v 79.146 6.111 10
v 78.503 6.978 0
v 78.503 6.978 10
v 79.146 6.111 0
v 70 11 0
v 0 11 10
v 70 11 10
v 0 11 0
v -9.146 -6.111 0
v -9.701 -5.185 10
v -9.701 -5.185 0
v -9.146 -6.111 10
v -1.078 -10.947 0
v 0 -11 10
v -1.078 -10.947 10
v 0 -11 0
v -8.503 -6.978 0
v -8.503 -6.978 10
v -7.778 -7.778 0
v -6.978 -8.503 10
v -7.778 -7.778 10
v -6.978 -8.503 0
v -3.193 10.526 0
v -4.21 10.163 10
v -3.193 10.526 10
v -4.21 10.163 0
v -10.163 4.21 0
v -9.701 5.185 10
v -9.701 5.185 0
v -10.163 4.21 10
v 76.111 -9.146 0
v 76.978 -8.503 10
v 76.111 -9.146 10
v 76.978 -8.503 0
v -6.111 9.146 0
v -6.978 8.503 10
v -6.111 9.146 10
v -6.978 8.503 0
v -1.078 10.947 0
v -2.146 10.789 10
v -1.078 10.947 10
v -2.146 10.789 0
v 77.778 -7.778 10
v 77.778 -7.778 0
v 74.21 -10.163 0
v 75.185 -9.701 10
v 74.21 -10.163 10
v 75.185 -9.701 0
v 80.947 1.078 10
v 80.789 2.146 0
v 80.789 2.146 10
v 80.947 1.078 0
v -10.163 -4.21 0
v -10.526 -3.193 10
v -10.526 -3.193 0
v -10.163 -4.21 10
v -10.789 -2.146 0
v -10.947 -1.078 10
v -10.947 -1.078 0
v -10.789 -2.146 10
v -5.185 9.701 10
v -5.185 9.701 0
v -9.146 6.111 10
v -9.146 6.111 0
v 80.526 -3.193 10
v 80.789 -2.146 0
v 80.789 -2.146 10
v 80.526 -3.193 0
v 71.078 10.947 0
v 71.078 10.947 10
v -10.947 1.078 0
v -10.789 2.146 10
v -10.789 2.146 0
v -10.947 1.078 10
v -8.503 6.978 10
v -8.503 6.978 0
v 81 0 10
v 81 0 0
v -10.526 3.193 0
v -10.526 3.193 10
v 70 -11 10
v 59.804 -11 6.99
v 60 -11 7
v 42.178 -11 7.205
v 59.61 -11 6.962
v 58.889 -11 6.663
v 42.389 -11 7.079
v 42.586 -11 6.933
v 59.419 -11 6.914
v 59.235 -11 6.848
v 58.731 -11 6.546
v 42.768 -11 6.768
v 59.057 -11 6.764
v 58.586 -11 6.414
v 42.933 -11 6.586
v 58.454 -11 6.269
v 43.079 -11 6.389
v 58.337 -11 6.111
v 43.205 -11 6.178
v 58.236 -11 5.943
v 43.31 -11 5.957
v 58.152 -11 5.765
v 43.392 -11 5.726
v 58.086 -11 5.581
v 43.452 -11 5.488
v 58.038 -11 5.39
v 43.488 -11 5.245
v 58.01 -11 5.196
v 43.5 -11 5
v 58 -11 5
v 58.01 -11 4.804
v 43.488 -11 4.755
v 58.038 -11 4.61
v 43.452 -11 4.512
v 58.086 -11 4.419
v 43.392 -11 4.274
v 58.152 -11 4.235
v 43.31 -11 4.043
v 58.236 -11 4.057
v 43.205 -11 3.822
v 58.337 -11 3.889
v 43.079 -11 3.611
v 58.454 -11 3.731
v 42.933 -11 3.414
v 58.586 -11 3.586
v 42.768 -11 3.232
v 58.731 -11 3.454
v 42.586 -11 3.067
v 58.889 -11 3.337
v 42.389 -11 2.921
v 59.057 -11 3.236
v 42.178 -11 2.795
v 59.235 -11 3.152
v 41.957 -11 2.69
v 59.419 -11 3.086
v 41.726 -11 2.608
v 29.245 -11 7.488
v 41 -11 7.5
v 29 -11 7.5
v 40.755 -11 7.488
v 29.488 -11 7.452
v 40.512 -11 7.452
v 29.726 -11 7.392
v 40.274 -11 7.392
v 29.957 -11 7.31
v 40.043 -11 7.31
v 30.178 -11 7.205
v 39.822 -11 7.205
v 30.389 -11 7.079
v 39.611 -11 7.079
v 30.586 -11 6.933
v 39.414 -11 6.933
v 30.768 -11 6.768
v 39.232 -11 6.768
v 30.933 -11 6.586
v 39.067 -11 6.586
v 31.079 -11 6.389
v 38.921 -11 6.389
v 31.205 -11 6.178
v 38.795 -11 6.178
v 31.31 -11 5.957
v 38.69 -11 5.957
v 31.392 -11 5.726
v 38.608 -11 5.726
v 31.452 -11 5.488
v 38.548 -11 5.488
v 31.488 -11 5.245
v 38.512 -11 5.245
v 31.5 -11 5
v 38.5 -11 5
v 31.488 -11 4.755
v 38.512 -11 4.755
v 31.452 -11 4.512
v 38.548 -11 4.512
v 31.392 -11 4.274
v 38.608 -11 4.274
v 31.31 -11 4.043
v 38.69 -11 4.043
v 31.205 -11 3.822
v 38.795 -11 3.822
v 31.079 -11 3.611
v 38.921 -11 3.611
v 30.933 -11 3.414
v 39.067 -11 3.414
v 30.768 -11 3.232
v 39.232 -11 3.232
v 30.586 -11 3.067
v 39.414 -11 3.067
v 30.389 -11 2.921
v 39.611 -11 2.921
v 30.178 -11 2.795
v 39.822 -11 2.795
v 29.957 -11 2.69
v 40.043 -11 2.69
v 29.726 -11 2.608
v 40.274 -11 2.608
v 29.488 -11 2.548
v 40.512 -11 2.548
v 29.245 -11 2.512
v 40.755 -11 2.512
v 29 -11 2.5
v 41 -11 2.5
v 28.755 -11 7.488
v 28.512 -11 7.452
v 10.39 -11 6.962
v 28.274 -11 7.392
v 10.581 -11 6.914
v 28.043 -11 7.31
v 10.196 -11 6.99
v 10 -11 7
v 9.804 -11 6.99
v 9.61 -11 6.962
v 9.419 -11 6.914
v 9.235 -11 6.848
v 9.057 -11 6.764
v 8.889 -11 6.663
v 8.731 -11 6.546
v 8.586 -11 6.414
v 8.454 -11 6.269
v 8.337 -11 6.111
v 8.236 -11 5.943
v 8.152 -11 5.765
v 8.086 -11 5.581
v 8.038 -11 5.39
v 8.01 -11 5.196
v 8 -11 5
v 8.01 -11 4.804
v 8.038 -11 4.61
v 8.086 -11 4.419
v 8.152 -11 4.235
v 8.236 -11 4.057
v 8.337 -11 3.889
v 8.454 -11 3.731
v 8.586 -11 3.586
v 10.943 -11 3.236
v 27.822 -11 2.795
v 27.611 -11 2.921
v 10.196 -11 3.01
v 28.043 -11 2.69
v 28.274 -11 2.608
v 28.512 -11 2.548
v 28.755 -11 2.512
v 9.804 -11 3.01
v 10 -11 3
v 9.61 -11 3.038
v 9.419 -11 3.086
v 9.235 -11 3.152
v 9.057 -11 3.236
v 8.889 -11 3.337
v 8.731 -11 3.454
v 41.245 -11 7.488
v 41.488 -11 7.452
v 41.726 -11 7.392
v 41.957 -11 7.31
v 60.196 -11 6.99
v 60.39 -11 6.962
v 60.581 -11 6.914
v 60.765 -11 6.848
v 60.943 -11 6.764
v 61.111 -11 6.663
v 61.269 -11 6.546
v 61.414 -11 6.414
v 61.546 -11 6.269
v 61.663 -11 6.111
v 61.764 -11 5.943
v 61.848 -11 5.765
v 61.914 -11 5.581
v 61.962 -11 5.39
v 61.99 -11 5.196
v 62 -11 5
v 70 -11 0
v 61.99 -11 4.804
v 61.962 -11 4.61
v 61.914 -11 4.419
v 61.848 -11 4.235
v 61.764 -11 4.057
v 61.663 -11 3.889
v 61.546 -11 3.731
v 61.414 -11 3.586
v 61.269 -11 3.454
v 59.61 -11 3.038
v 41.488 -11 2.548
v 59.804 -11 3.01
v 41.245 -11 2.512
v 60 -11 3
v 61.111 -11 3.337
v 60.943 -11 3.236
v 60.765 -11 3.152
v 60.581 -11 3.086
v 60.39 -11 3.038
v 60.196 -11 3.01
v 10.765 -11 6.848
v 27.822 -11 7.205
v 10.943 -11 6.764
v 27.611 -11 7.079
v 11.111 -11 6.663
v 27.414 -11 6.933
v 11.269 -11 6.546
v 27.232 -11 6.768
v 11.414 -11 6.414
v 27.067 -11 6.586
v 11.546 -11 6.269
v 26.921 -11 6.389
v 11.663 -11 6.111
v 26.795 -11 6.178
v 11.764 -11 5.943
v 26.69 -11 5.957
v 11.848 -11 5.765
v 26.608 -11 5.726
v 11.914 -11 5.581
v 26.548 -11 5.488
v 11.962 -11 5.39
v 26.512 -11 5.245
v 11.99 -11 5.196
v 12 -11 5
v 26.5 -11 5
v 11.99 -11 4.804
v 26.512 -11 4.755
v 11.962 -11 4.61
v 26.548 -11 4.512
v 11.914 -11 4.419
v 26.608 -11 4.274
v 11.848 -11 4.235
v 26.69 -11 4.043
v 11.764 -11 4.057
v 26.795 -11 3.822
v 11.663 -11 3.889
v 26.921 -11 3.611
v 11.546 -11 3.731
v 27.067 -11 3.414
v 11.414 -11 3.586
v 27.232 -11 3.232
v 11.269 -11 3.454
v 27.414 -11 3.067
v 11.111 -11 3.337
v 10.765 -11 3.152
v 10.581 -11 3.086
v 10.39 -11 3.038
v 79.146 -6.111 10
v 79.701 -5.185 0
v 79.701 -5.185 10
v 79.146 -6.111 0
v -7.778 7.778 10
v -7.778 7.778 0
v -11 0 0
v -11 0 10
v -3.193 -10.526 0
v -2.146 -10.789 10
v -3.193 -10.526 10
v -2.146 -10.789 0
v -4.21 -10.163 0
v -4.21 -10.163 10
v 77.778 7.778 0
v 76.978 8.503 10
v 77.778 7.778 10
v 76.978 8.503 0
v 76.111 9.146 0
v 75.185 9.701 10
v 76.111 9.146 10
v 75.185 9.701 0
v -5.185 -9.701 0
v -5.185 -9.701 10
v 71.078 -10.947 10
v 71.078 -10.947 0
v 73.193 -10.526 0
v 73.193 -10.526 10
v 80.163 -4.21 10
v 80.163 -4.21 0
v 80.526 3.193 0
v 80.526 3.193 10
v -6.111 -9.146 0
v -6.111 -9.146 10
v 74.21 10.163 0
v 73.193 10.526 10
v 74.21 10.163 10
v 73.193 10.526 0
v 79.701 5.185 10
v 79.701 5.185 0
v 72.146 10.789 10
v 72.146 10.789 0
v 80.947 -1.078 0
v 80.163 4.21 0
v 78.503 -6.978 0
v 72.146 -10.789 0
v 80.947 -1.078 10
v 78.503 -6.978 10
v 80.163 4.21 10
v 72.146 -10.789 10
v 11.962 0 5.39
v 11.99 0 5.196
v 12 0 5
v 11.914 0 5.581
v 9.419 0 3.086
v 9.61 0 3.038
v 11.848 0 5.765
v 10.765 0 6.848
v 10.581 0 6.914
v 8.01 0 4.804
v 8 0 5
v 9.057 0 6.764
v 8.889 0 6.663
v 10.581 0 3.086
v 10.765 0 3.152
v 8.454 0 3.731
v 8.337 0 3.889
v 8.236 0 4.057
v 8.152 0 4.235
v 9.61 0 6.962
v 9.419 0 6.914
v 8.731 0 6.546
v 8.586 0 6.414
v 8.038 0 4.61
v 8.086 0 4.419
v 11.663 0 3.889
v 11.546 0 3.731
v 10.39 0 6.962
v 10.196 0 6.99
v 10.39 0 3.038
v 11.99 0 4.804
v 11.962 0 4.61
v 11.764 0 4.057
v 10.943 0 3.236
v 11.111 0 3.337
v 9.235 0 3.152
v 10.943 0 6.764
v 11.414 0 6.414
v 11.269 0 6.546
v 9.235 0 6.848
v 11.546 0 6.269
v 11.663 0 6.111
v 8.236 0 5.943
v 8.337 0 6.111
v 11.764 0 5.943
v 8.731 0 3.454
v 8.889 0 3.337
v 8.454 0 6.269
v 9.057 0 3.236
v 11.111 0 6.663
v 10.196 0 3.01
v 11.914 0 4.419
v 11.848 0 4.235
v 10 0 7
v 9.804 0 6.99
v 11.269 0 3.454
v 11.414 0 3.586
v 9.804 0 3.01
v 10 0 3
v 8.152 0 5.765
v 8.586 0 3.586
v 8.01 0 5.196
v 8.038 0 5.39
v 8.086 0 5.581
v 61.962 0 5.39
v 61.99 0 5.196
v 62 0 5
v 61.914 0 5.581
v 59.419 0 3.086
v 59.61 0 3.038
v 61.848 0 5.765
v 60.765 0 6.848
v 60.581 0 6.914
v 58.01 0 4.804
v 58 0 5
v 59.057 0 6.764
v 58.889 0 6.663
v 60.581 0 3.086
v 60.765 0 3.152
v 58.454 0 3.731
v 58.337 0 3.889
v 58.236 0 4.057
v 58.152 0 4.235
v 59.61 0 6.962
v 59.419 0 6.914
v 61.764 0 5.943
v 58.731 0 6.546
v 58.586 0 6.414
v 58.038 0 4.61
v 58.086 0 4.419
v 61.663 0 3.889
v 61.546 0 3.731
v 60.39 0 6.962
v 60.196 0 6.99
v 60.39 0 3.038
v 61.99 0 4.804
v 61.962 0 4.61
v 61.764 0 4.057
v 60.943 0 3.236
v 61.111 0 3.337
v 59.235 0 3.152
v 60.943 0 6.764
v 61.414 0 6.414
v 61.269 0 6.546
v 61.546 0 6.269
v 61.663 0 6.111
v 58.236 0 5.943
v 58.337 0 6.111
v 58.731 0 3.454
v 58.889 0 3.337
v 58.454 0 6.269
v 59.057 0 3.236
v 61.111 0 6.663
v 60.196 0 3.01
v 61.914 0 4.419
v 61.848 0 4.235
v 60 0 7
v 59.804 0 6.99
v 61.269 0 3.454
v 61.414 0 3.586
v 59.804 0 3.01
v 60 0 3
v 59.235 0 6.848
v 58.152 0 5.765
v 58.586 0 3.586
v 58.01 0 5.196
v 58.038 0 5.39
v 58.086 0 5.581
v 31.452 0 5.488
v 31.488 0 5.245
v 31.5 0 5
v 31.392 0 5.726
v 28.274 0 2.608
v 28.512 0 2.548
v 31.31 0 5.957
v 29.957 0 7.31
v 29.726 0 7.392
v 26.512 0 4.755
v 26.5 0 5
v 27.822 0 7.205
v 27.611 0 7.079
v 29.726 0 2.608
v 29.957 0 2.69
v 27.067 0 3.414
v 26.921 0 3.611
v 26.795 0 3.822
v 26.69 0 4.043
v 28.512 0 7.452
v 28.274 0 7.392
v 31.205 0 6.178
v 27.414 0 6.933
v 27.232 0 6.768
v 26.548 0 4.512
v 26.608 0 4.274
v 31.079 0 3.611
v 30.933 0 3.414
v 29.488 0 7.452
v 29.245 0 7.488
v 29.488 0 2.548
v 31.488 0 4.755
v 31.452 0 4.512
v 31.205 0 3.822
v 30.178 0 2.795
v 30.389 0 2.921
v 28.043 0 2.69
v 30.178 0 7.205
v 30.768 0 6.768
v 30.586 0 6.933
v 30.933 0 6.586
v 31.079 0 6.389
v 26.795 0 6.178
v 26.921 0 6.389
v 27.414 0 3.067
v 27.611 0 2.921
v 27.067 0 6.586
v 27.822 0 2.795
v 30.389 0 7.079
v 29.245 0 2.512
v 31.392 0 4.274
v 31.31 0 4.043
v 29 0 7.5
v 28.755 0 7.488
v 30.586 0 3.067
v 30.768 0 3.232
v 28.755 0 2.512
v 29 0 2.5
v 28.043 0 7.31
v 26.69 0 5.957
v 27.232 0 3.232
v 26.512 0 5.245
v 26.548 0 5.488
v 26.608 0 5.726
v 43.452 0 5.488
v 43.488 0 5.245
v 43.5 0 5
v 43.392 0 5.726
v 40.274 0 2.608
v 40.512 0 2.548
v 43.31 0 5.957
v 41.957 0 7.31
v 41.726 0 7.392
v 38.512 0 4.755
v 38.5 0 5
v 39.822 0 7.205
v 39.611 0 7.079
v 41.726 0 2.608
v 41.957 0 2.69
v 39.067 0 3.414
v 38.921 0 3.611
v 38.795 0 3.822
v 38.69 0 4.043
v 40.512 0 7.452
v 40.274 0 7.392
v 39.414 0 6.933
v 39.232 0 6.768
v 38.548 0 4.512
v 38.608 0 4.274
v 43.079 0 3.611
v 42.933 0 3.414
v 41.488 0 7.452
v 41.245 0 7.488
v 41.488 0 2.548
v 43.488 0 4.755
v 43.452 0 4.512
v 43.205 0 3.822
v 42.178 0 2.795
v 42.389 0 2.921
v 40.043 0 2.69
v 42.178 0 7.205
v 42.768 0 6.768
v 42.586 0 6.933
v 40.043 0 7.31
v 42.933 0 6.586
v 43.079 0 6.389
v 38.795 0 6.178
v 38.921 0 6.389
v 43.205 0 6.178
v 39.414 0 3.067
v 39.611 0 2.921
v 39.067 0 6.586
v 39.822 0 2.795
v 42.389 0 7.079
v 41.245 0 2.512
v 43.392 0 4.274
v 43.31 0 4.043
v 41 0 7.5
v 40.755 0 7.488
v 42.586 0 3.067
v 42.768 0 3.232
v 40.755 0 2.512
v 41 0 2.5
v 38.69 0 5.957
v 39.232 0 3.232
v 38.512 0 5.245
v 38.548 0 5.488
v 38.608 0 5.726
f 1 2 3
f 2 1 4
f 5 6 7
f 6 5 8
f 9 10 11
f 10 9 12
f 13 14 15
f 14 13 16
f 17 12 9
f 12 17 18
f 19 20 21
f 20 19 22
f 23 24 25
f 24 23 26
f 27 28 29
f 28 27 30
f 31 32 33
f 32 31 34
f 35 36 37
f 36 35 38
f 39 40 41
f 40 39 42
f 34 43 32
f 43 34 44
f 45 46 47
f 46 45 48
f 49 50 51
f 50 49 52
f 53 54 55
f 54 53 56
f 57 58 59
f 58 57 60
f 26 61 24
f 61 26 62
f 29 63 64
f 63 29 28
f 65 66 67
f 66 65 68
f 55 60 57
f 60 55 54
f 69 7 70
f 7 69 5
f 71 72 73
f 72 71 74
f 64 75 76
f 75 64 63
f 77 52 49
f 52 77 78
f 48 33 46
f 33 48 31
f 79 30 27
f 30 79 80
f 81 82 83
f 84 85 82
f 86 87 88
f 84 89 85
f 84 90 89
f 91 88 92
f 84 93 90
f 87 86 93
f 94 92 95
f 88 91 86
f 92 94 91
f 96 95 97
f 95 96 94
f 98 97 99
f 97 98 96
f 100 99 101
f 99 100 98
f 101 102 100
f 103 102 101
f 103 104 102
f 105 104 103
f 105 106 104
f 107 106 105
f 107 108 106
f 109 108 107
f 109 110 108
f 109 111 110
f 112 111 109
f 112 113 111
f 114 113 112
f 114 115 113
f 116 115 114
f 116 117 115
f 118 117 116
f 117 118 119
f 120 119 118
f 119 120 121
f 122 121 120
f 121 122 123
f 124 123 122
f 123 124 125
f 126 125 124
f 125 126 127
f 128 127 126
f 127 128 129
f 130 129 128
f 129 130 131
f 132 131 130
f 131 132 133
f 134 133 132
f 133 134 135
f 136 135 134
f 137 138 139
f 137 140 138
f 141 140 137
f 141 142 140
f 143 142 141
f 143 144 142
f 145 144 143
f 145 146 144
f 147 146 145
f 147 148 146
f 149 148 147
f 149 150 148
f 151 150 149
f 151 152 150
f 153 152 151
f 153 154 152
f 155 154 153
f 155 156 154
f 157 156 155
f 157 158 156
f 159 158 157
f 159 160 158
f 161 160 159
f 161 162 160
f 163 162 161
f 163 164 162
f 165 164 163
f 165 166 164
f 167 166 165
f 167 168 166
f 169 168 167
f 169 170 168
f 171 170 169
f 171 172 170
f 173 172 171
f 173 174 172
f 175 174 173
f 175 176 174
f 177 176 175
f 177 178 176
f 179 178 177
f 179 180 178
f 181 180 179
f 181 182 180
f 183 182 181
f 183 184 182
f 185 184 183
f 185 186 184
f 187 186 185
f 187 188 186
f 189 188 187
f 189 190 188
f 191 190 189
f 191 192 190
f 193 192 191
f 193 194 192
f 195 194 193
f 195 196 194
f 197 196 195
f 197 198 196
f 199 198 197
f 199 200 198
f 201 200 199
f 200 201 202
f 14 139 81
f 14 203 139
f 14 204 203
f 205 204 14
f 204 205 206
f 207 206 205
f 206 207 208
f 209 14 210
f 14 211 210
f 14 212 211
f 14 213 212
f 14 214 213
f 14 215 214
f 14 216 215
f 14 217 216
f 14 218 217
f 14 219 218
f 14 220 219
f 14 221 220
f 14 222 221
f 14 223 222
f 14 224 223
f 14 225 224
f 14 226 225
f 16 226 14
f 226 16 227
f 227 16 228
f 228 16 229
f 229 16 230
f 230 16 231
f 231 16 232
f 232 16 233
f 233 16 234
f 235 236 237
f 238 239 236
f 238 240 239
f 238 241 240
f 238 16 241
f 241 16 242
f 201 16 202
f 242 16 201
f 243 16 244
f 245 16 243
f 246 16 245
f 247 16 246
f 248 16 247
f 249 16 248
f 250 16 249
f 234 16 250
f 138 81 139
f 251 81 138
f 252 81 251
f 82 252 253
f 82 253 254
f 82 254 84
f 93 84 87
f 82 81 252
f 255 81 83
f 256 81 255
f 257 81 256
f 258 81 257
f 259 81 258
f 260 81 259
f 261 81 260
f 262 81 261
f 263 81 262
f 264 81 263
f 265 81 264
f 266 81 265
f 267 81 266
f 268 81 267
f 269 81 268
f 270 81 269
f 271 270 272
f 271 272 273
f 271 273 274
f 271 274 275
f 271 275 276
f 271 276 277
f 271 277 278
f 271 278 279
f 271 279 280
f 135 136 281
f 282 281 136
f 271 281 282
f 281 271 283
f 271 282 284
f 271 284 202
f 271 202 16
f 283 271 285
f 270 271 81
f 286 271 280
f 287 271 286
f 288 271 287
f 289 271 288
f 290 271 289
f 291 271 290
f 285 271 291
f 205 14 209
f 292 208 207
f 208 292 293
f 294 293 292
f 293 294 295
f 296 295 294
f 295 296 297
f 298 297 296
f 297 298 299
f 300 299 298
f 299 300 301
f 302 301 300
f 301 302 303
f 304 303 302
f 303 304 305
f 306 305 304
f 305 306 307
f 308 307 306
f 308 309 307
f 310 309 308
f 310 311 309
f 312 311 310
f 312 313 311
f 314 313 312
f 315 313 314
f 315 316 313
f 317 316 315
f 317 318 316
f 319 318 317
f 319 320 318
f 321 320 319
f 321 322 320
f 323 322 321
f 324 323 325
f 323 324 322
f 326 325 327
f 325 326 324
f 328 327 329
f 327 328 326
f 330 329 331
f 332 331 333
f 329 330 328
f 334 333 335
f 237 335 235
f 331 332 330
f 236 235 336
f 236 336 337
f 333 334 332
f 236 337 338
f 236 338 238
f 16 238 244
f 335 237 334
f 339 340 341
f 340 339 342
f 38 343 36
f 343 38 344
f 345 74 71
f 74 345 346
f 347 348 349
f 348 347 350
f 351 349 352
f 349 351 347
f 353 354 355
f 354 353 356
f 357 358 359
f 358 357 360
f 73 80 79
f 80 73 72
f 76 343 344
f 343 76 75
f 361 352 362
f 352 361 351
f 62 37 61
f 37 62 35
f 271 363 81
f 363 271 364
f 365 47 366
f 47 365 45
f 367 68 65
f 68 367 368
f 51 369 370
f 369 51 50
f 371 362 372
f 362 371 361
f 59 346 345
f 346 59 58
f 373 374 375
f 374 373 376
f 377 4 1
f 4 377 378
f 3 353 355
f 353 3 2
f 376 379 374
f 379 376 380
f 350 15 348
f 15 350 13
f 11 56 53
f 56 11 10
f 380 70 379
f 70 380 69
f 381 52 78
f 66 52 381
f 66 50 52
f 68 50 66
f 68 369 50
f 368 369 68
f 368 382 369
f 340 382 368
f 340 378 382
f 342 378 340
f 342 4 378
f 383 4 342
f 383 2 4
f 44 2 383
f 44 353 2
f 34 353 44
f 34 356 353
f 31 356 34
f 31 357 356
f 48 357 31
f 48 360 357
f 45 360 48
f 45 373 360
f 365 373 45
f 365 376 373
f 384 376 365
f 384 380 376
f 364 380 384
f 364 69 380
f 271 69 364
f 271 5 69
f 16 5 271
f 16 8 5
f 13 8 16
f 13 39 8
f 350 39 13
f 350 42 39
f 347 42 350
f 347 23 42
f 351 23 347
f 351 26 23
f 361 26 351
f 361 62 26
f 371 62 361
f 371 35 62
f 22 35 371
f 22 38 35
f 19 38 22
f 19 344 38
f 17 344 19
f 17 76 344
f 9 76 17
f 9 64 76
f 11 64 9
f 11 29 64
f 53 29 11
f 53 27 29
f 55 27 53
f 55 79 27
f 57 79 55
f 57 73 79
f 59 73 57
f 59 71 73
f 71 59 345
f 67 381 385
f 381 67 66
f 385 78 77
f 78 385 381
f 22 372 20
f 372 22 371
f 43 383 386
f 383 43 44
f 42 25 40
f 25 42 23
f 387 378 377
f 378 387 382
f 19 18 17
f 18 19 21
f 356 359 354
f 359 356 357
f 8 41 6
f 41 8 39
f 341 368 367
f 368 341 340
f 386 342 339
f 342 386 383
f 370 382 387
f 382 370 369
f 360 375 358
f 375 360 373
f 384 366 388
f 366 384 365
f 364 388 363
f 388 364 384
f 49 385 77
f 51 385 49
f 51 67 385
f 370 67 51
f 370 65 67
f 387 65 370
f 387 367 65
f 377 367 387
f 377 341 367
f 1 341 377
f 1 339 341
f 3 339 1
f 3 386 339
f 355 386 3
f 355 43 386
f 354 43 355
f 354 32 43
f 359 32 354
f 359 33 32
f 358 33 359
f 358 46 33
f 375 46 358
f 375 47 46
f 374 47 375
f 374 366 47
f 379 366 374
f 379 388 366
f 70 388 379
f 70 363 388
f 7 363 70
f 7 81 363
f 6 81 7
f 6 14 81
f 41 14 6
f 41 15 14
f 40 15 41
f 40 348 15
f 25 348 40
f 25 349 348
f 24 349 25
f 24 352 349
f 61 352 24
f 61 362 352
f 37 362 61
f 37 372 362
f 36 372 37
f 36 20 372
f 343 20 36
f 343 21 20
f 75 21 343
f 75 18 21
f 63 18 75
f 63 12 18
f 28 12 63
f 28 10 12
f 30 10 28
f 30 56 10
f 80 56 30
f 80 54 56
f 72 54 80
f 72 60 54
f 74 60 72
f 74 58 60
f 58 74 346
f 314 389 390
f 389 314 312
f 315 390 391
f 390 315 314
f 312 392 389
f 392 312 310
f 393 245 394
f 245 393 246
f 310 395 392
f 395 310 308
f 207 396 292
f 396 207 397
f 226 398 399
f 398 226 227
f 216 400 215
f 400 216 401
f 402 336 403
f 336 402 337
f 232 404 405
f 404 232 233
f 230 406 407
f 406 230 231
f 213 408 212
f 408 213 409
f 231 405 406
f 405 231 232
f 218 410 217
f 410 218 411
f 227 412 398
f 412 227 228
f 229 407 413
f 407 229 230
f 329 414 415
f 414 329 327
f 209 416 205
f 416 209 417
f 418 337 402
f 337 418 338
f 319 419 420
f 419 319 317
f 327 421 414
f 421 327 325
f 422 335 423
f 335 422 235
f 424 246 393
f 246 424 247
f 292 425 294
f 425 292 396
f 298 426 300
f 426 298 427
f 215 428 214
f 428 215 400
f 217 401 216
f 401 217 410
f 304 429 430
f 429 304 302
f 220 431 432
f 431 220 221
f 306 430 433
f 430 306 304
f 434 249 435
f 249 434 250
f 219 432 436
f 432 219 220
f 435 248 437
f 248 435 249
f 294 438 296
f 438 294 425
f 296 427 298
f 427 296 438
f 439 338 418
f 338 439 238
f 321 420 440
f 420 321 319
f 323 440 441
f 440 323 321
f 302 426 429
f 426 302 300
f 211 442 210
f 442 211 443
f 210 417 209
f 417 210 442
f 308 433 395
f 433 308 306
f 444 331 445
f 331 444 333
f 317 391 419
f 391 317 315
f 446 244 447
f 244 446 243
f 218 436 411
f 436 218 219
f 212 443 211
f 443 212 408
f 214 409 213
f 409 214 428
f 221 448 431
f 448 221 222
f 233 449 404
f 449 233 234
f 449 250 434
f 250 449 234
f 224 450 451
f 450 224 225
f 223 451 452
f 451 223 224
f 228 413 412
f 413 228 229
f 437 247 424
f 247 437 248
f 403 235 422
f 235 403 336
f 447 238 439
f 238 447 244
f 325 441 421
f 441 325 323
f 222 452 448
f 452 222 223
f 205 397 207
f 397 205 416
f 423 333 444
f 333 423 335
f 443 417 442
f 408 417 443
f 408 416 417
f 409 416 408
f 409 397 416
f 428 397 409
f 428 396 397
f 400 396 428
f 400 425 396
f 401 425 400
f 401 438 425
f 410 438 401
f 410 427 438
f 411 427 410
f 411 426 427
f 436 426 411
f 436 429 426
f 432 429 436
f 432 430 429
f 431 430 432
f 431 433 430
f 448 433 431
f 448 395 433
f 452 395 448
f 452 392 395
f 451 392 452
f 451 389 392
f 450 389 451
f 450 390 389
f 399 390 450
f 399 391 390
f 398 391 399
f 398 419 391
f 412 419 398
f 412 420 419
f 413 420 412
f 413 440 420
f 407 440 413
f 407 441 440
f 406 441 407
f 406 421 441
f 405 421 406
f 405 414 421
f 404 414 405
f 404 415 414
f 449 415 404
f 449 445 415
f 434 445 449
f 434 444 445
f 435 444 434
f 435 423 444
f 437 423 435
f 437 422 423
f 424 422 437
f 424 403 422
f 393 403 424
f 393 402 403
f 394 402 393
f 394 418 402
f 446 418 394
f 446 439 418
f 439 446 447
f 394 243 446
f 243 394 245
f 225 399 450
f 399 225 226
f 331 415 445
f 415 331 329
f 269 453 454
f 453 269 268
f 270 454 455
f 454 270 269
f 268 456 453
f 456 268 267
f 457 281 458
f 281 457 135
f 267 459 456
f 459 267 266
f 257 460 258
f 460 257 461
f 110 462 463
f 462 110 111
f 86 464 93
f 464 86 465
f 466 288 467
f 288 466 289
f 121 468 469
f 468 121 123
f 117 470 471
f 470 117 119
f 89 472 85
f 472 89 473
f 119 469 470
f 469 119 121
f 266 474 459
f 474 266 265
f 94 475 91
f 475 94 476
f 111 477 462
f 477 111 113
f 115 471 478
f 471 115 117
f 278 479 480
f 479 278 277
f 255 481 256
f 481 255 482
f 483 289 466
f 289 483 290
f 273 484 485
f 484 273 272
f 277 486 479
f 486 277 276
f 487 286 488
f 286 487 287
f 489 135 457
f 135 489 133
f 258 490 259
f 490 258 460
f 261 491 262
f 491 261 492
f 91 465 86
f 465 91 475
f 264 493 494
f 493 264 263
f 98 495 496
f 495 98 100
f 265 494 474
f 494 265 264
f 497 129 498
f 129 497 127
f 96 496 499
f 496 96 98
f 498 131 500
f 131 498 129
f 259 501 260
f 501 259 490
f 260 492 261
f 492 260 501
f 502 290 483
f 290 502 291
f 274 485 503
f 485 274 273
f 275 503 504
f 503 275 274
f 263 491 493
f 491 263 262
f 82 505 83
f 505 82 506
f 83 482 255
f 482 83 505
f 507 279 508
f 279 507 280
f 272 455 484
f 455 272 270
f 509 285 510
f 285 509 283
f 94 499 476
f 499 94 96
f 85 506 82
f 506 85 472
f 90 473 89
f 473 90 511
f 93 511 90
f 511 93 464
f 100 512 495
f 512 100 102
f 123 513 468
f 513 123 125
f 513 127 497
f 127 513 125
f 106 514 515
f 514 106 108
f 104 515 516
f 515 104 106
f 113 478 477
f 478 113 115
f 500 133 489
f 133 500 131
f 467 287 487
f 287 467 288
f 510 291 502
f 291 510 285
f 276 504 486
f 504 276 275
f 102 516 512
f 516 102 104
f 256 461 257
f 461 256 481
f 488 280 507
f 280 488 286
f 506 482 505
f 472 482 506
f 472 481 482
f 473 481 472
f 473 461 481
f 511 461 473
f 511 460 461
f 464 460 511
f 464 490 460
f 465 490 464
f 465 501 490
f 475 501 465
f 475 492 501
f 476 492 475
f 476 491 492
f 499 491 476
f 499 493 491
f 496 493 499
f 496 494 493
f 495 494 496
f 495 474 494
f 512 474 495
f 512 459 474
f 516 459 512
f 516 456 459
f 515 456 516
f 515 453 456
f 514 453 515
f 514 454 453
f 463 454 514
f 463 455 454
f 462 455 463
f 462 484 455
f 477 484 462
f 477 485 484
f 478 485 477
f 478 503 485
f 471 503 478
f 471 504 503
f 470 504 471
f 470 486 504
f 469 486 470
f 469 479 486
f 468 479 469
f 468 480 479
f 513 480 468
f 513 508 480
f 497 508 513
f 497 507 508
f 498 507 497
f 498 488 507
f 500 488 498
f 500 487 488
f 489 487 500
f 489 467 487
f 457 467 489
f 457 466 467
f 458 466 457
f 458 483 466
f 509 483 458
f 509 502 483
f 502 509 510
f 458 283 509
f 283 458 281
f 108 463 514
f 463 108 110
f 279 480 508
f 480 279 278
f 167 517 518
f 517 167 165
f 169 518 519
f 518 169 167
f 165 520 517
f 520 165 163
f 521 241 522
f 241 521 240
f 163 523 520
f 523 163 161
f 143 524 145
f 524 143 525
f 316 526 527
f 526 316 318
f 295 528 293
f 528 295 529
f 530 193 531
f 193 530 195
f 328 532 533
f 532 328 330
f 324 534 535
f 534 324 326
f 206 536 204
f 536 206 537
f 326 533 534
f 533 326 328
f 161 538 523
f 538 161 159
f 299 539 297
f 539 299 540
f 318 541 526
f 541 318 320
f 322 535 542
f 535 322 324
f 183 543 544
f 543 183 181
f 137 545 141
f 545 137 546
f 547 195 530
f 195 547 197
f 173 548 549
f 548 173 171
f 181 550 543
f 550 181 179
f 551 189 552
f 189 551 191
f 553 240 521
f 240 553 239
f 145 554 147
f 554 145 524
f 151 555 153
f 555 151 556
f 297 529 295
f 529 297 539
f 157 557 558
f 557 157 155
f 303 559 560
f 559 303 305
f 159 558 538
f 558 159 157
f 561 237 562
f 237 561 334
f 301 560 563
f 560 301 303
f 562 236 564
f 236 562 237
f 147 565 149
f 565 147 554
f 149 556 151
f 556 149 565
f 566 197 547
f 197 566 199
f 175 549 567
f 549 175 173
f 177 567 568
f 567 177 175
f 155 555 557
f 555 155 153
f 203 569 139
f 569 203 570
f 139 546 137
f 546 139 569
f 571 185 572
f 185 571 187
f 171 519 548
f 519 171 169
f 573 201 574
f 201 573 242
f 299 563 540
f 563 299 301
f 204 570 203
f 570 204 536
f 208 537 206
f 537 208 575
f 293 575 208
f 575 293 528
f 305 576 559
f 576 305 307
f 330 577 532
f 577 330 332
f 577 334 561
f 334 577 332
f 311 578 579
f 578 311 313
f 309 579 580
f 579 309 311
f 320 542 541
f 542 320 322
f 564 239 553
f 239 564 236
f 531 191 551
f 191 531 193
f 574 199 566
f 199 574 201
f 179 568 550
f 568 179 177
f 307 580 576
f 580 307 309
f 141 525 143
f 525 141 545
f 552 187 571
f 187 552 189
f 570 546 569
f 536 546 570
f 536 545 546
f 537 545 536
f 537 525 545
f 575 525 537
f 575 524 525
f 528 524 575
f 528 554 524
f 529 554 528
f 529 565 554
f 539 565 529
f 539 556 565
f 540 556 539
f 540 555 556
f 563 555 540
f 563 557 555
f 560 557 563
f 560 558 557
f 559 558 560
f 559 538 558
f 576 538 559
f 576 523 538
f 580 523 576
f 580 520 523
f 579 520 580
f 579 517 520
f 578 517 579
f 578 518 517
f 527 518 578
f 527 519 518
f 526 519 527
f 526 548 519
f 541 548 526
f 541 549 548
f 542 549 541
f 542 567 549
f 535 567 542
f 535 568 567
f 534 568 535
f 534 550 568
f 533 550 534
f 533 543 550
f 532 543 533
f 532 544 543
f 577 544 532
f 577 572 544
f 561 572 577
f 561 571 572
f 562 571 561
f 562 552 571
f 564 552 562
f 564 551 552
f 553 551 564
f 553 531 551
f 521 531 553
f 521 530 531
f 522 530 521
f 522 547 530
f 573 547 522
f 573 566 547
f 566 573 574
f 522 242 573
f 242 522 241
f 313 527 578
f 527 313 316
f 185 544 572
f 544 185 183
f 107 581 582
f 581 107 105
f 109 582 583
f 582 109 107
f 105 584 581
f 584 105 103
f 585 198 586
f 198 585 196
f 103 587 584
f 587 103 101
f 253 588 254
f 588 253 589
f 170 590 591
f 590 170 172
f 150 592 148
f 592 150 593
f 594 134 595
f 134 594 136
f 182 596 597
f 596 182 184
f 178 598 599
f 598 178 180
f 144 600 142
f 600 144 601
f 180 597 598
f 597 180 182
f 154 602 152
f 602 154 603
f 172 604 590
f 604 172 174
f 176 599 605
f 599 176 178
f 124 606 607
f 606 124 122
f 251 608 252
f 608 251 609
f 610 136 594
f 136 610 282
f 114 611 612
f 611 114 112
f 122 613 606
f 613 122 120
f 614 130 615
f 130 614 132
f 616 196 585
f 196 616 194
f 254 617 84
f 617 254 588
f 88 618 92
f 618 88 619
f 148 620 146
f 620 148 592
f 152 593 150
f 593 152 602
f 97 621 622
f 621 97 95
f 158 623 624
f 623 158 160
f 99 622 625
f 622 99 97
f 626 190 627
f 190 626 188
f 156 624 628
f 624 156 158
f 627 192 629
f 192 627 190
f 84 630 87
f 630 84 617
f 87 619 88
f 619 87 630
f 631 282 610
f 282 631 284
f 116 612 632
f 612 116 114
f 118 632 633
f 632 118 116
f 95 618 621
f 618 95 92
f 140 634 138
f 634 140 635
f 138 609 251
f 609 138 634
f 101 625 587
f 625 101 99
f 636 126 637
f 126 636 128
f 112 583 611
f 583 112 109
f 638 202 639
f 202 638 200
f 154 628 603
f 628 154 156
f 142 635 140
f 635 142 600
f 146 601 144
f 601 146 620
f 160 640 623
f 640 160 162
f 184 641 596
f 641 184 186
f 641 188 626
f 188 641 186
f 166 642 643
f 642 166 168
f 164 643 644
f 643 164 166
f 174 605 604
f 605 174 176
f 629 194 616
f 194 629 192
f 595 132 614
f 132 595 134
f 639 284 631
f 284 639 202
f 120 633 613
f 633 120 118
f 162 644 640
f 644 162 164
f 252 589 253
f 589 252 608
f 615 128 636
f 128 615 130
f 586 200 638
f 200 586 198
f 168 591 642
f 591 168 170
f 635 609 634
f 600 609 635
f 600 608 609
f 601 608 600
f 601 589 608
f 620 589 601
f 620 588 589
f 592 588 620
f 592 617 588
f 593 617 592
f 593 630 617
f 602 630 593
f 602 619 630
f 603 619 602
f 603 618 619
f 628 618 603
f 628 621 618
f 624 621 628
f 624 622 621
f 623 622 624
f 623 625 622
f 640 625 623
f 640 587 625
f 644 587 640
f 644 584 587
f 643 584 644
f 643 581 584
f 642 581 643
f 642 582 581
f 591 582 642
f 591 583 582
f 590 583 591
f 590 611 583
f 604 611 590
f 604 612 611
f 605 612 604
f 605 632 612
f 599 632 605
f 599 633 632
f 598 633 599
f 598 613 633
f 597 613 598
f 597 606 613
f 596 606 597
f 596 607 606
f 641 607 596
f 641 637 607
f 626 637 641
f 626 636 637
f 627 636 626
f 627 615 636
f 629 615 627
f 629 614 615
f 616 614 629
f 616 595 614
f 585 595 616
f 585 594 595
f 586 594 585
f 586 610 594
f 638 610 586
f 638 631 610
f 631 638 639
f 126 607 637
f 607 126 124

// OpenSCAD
// Loop antenna feed point insulators
// All dimensions in mm. Designed for printers up to 200x200x200.

$fn = 64;

// Feed point plate with two wire tie holes and two feed holes.
module loop_feed_insulator(body_len=70, body_w=22, body_h=10,
                           hole_d=4, feed_d=5, edge=10) {
    difference() {
        hull() {
            translate([0, 0, 0]) cylinder(h=body_h, r=body_w/2);
            translate([body_len, 0, 0]) cylinder(h=body_h, r=body_w/2);
        }
        translate([edge, 0, body_h/2]) rotate([90, 0, 0]) cylinder(h=body_w+2, r=hole_d/2);
        translate([body_len - edge, 0, body_h/2]) rotate([90, 0, 0]) cylinder(h=body_w+2, r=hole_d/2);
        translate([body_len/2 - 6, 0, body_h/2]) rotate([90, 0, 0]) cylinder(h=body_w+2, r=feed_d/2);
        translate([body_len/2 + 6, 0, body_h/2]) rotate([90, 0, 0]) cylinder(h=body_w+2, r=feed_d/2);
    }
}

loop_feed_insulator();
